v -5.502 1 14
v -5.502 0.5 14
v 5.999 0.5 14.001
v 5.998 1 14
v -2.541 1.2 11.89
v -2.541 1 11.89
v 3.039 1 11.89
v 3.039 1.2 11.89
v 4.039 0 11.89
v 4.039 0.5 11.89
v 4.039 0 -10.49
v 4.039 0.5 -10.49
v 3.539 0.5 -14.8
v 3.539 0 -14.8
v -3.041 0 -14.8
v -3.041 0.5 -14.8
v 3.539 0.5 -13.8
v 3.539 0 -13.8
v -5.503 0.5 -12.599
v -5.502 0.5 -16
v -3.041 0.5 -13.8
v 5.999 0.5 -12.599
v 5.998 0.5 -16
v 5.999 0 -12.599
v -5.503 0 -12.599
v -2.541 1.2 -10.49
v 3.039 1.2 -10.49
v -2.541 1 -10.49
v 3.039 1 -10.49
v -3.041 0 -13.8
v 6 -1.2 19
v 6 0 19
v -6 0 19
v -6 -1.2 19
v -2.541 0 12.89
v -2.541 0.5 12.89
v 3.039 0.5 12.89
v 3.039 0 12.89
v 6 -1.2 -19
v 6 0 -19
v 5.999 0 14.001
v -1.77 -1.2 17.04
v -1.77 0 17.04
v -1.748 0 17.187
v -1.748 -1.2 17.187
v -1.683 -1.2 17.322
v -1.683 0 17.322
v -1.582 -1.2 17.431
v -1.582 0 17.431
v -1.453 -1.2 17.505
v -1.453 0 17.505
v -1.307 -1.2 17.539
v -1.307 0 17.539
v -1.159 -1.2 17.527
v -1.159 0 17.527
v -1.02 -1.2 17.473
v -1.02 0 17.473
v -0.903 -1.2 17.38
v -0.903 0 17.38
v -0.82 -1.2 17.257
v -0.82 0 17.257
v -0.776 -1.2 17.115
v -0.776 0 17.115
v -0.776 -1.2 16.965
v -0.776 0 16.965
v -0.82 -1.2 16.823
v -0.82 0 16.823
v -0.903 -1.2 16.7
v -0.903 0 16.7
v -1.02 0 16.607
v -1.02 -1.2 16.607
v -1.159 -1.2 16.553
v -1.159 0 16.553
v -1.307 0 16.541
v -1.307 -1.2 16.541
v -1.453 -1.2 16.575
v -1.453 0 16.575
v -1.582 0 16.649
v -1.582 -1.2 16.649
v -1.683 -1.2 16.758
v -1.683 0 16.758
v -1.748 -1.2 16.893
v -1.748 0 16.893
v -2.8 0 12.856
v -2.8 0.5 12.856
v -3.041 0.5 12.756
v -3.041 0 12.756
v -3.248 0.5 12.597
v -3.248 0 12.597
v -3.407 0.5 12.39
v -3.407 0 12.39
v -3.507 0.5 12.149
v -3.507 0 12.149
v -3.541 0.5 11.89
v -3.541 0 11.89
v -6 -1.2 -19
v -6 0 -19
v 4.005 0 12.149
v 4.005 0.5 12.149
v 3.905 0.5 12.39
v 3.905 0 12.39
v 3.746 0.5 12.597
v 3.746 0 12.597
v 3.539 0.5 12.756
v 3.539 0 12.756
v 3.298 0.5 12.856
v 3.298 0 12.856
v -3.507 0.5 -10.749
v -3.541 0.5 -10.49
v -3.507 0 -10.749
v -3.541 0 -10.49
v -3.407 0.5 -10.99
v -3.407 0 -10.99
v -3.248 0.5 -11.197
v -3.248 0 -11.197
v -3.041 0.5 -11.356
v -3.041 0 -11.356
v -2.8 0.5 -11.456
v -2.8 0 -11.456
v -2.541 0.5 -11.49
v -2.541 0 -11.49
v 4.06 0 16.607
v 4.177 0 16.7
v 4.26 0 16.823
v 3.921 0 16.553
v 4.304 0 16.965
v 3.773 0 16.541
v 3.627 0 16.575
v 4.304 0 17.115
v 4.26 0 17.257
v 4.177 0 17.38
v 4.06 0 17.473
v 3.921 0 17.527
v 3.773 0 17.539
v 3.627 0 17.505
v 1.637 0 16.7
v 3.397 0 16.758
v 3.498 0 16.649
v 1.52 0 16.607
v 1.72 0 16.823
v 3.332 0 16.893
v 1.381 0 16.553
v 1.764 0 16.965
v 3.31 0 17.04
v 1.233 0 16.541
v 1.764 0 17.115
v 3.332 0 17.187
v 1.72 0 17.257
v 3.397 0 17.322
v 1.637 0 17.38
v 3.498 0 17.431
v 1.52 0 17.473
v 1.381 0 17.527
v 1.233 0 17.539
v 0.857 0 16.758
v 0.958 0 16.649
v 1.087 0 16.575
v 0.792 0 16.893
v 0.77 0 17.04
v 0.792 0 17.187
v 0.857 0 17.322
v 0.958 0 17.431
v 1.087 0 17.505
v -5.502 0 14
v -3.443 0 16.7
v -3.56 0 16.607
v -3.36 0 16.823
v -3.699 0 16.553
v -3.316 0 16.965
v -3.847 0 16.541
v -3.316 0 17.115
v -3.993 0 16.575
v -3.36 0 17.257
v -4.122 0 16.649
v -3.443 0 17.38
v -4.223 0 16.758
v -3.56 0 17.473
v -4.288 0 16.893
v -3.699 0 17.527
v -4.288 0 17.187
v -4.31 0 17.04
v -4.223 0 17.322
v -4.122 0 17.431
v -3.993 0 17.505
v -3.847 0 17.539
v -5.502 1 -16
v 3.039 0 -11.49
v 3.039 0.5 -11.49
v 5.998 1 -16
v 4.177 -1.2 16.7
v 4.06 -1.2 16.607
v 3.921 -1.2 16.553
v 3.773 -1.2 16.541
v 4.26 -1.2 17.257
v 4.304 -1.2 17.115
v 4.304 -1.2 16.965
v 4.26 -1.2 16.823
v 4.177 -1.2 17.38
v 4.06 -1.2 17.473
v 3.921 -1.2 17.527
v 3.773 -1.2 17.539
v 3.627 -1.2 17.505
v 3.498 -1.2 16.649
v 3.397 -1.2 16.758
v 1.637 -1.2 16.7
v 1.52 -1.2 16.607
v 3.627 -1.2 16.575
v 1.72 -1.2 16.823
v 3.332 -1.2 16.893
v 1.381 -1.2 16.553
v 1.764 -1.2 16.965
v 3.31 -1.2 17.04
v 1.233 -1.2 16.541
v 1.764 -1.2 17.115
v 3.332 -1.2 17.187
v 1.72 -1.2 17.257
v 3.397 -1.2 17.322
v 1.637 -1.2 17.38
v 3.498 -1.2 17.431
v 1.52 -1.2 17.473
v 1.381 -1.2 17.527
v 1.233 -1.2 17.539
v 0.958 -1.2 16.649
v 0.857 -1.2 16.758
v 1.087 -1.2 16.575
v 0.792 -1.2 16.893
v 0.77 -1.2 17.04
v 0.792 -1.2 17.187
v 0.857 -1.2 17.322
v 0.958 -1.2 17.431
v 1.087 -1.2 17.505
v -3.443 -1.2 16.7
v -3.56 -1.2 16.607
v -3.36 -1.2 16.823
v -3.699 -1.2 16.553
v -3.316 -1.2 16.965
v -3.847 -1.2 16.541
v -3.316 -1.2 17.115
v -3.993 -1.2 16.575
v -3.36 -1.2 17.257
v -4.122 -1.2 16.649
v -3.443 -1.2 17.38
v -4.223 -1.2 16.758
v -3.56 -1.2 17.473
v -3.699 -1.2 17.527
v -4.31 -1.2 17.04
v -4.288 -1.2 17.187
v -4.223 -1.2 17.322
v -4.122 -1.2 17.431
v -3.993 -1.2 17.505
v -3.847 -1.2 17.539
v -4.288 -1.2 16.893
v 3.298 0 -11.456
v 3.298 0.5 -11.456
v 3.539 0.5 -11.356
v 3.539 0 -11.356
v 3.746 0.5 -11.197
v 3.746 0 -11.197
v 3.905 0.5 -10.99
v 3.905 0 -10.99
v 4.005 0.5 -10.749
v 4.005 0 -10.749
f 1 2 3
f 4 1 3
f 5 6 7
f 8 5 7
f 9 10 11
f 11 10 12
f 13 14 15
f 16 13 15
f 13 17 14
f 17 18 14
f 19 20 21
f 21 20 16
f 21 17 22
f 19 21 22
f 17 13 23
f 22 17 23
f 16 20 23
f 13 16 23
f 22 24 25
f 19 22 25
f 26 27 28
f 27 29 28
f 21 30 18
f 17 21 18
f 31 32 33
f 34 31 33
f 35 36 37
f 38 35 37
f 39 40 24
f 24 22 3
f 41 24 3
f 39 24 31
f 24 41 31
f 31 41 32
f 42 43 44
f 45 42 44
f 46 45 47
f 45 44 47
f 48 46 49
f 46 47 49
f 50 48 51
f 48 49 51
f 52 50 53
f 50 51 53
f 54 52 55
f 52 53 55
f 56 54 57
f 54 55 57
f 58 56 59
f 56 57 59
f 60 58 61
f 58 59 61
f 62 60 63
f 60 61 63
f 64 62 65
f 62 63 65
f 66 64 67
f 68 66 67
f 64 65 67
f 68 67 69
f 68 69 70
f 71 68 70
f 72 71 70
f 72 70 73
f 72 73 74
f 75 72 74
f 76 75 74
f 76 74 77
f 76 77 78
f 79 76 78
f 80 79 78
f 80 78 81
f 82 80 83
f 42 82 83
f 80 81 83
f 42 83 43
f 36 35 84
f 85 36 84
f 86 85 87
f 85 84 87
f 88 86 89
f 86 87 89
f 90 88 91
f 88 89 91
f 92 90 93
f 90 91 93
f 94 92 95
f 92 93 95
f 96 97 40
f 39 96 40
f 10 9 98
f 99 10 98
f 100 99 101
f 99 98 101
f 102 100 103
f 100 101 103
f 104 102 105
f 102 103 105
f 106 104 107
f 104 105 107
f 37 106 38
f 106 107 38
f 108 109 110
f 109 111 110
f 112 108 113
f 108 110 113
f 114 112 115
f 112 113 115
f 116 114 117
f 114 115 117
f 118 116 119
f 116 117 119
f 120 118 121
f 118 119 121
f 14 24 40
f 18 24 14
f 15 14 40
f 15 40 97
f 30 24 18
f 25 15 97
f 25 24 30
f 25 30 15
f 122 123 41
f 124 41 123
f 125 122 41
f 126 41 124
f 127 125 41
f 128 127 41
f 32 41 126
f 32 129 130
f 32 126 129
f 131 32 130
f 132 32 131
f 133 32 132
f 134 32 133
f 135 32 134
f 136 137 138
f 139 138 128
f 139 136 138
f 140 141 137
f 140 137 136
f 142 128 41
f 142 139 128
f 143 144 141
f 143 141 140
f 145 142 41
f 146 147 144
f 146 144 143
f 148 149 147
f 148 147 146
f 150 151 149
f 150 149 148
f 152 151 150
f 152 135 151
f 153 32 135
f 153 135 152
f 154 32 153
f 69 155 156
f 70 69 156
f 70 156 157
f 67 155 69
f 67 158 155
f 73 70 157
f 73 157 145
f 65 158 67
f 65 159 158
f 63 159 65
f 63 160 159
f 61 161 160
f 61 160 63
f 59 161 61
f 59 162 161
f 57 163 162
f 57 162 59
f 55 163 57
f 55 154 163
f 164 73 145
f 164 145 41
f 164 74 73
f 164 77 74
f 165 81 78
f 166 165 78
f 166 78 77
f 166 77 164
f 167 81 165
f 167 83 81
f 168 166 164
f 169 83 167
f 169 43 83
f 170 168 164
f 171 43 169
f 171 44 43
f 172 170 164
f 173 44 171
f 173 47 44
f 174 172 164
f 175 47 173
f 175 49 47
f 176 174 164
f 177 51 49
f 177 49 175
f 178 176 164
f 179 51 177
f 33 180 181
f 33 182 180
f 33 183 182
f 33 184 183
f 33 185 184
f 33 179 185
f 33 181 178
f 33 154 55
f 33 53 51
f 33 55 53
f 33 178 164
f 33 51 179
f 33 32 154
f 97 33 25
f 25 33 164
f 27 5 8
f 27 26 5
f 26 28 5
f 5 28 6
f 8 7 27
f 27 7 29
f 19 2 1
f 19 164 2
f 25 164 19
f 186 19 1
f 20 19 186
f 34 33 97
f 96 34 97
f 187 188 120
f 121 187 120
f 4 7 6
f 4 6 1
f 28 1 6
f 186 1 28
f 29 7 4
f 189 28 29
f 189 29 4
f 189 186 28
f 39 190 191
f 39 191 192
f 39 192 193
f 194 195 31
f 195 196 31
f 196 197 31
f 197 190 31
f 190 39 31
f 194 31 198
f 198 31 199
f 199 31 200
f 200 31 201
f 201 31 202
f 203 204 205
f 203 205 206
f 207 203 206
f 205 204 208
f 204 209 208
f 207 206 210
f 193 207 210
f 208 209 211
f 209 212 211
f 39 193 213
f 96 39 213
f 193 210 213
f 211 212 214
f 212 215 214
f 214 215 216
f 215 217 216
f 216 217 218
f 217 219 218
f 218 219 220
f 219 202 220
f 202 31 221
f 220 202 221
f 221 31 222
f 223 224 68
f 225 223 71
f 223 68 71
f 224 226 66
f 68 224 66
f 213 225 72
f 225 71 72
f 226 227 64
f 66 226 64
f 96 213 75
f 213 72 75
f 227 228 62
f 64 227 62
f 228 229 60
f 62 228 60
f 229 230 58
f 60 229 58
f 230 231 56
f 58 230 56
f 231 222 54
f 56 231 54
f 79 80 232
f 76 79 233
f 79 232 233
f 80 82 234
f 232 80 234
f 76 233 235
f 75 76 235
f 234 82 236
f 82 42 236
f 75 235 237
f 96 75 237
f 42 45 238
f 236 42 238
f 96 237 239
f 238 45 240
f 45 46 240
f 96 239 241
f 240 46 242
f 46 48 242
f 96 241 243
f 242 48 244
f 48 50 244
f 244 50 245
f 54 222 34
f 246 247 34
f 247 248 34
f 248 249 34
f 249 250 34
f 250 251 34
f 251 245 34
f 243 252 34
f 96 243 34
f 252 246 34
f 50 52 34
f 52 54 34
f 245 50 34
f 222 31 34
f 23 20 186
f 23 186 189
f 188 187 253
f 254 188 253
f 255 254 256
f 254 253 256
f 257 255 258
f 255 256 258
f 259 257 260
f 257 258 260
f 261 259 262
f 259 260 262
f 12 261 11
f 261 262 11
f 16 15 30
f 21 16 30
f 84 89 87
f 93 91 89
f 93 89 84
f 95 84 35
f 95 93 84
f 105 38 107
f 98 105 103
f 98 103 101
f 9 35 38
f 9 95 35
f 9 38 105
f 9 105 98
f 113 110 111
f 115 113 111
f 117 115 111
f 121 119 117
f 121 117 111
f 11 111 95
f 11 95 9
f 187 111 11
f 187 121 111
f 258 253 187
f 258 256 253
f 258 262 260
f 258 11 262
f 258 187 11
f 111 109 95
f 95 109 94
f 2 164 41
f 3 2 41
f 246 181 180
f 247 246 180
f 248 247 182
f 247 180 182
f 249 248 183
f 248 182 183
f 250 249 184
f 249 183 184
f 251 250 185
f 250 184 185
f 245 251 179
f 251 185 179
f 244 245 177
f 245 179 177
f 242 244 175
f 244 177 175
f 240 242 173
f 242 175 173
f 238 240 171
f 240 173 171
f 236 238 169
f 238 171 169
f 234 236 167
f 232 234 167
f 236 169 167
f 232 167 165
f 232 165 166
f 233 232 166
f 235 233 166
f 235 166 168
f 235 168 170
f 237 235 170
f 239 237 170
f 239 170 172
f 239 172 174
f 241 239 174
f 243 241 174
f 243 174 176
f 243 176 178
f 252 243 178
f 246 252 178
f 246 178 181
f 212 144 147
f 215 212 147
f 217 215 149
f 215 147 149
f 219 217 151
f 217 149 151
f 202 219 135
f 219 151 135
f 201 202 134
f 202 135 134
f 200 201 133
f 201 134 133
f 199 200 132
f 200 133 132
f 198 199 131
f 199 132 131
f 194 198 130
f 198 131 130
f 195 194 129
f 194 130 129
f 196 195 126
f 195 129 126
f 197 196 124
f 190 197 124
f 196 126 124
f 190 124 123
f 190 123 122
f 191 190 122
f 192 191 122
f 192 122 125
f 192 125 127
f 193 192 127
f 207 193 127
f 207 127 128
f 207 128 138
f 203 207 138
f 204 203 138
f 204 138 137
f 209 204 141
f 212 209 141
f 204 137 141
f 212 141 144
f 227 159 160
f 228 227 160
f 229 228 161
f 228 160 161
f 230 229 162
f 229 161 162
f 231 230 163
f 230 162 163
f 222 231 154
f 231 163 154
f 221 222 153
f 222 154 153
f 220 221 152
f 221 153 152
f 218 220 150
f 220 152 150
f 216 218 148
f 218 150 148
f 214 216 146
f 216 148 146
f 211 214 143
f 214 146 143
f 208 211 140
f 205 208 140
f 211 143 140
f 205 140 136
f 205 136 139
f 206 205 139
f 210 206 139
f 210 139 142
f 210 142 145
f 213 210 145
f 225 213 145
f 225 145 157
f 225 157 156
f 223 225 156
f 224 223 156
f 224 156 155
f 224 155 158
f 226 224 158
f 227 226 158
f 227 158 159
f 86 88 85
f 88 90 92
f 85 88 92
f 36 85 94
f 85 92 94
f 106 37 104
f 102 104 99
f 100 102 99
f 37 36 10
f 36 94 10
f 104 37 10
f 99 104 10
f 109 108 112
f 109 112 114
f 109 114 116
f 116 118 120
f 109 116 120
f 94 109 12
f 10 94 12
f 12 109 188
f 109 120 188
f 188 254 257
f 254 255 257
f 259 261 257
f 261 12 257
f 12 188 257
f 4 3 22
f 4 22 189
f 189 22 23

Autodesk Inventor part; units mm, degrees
ref_plane "YZ Plane" through (0, 0, 0) normal (1, 0, 0) x (0, 1, 0)
ref_plane "XZ Plane" through (0, 0, 0) normal (0, 1, 0) x (-1, 0, 0)
sketch "Sketch1" plane through (0, 0, 0) normal (0, 1, 0) x (-1, 0, 0)
  line L0 (-6, 19) -> (6, 19)
  line L1 (6, 19) -> (6, -19)
  line L2 (6, -19) -> (-6, -19)
  line L3 (-6, -19) -> (-6, 19)
  line L4 (-6, 19) -> (6, -19) construction
  line L5 (6, 19) -> (-6, -19) construction
  line L6 (5.502, -16) -> (-5.998, -16)
  line L7 (5.502, 14) -> (5.502, -16)
  line L8 (0, 19) -> (0, -19) construction
  line L9 (5.503, 14.001) -> (-5.999, 14.001)
  line L10 (-5.999, 14.001) -> (-5.999, -12.599)
  line L11 (-5.999, -12.599) -> (5.503, -12.599)
  line L12 (3.541, 12.89) -> (-4.039, 12.89)
  line L13 (-4.039, 12.89) -> (-4.039, -11.49)
  line L14 (-4.039, -11.49) -> (3.541, -11.49)
  line L15 (3.541, -11.49) -> (3.541, 12.89)
  line L16 (2.541, 11.89) -> (-3.039, 11.89)
  line L17 (-3.039, 11.89) -> (-3.039, -10.49)
  line L18 (-3.039, -10.49) -> (2.541, -10.49)
  line L19 (2.541, -10.49) -> (2.541, 11.89)
  line L20 (-0.249, 12.89) -> (-0.249, -11.49) construction
  line L21 (3.541, 0.7) -> (-4.039, 0.7) construction
  circle A0 centre (-3.81, 17.04) radius 0.5
  circle A1 centre (-1.27, 17.04) radius 0.5
  circle A2 centre (1.27, 17.04) radius 0.5
  circle A3 centre (3.81, 17.04) radius 0.5
  line L22 (3.041, -13.8) -> (-3.539, -13.8)
  line L23 (-3.539, -13.8) -> (-3.539, -14.8)
  line L24 (-3.539, -14.8) -> (3.041, -14.8)
  line L25 (3.041, -14.8) -> (3.041, -13.8)
  line L26 (5.502, 14) -> (-5.998, 14)
  line L27 (5.503, -12.599) -> (5.503, 14.001)
  line L28 (-5.998, 14) -> (-5.998, -16)
  point P0 (0, 0)
  dimension "d0" = 12
  dimension "d1" = 38
  dimension "d2" = 3
  dimension "d3" = 30
  dimension "d5" = 26.6
  dimension "d6" = 7.58
  dimension "d7" = 24.38
  dimension "d8" = 5.58
  dimension "d9" = 22.38
  dimension "d10" = 1.96
  dimension "d11" = 7.51
  dimension "d13" = 2.19
  dimension "d14" = 1.96
  dimension "d15" = 1
  dimension "d18" = 2.54
  dimension "d27" = 1
  dimension "d28" = 1.2
  dimension "d32" = 0.001
  dimension "d33" = 0.001
  dimension "d34" = 0.001
  dimension "d35" = 11.5
  dimension "d36" = 0.001
extrude "Extrusion1" add sketch "Sketch1" against normal blind 1.2 contours L0 L1 L2 L3 L6 L7 L9 | L9 L7 L11 L3 | L11 L7 L6 L3 | L15 L14 L13 L12 | L19 L18 L17 L16 | L25 L24 L23 L22
extrude "Extrusion2" add sketch "Sketch1" along normal blind 0.5 contours L9 L7 L11 L3 | L15 L14 L13 L12 | L19 L18 L17 L16 | L25 L24 L23 L22
sketch "Sketch2" plane through (0, 0.5, 0) normal (0, 1, 0) x (1, 0, 0)
  line L0 (-5.502, -14) -> (-5.502, 16) projected
  line L1 (-5.502, 16) -> (5.998, 16) projected
  line L2 (-5.502, -14) -> (5.998, -14) projected
  line L3 (5.998, -14) -> (5.998, 16) projected
  line L4 (-3.541, -12.89) -> (4.039, -12.89) projected
  line L5 (-3.541, 11.49) -> (-3.541, -12.89) projected
  line L6 (4.039, -12.89) -> (4.039, 11.49) projected
  line L7 (4.039, 11.49) -> (-3.541, 11.49) projected
  point P0 (0, 0)
extrude "Extrusion3" add sketch "Sketch2" along normal blind 0.5 contours L0 L1 L3 L2 | L5 L7 L6 L4
sketch "Sketch3" plane through (0, 1, 0) normal (0, 1, 0) x (1, 0, 0)
  line L0 (-2.541, -11.89) -> (3.039, -11.89) projected
  line L1 (-2.541, 10.49) -> (-2.541, -11.89) projected
  line L2 (3.039, -11.89) -> (3.039, 10.49) projected
  line L3 (3.039, 10.49) -> (-2.541, 10.49) projected
  point P0 (0, 0)
extrude "Extrusion4" add sketch "Sketch3" along normal blind 0.2
extrude "Extrusion5" cut sketch "Sketch2" against normal blind 0.5 contours L5 L7 L6 L4
fillet "Fillet1" radius 1 4 edges at (-3.541, 0.25, 12.89) (4.039, 0.25, -11.49) (-3.541, 0.25, -11.49) (4.039, 0.25, 12.89)
sketch "Sketch4" plane through (0, -1.2, 0) normal (0, 1, 0) x (1, 0, 0)
  line L0 (2.785, -15.895) -> (2.585, -16.095)
  line L1 (2.585, -16.095) -> (2.585, -17.985)
  line L2 (2.585, -17.985) -> (2.785, -18.185)
  line L3 (2.785, -18.185) -> (4.835, -18.185)
  line L4 (4.835, -18.185) -> (5.035, -17.985)
  line L5 (5.035, -17.985) -> (5.035, -16.095)
  line L6 (5.035, -16.095) -> (4.835, -15.895)
  line L7 (4.835, -15.895) -> (2.785, -15.895)
  line L8 (3.81, -18.185) -> (3.81, -15.895) construction
  line L9 (2.585, -17.04) -> (5.035, -17.04) construction
  circle A0 centre (3.81, -17.04) radius 0.5 construction
  line L10 (3.51, -17.34) -> (4.11, -17.34)
  line L11 (4.11, -17.34) -> (4.11, -16.74)
  line L12 (4.11, -16.74) -> (3.51, -16.74)
  line L13 (3.51, -16.74) -> (3.51, -17.34)
  line L14 (3.51, -17.34) -> (4.11, -16.74) construction
  line L15 (4.11, -17.34) -> (3.51, -16.74) construction
  line L16 (6, -19) -> (-6, -19) construction
  line L17 (0.245, -15.895) -> (0.045, -16.095)
  line L18 (0.045, -16.095) -> (0.045, -17.985)
  line L19 (0.045, -17.985) -> (0.245, -18.185)
  line L20 (0.245, -18.185) -> (2.295, -18.185)
  line L21 (2.295, -18.185) -> (2.495, -17.985)
  line L22 (2.495, -17.985) -> (2.495, -16.095)
  line L23 (2.495, -16.095) -> (2.295, -15.895)
  line L24 (2.295, -15.895) -> (0.245, -15.895)
  line L25 (1.27, -18.185) -> (1.27, -15.895) construction
  line L26 (0.045, -17.04) -> (2.495, -17.04) construction
  circle A1 centre (1.27, -17.04) radius 0.5 construction
  line L27 (0.97, -17.34) -> (1.57, -17.34)
  line L28 (1.57, -17.34) -> (1.57, -16.74)
  line L29 (1.57, -16.74) -> (0.97, -16.74)
  line L30 (0.97, -16.74) -> (0.97, -17.34)
  line L31 (0.97, -17.34) -> (1.57, -16.74) construction
  line L32 (1.57, -17.34) -> (0.97, -16.74) construction
  line L33 (-2.295, -15.895) -> (-2.495, -16.095)
  line L34 (-2.495, -16.095) -> (-2.495, -17.985)
  line L35 (-2.495, -17.985) -> (-2.295, -18.185)
  line L36 (-2.295, -18.185) -> (-0.245, -18.185)
  line L37 (-0.245, -18.185) -> (-0.045, -17.985)
  line L38 (-0.045, -17.985) -> (-0.045, -16.095)
  line L39 (-0.045, -16.095) -> (-0.245, -15.895)
  line L40 (-0.245, -15.895) -> (-2.295, -15.895)
  line L41 (-1.27, -18.185) -> (-1.27, -15.895) construction
  line L42 (-2.495, -17.04) -> (-0.045, -17.04) construction
  circle A2 centre (-1.27, -17.04) radius 0.5 construction
  line L43 (-1.57, -17.34) -> (-0.97, -17.34)
  line L44 (-0.97, -17.34) -> (-0.97, -16.74)
  line L45 (-0.97, -16.74) -> (-1.57, -16.74)
  line L46 (-1.57, -16.74) -> (-1.57, -17.34)
  line L47 (-1.57, -17.34) -> (-0.97, -16.74) construction
  line L48 (-0.97, -17.34) -> (-1.57, -16.74) construction
  line L49 (-4.835, -15.895) -> (-5.035, -16.095)
  line L50 (-5.035, -16.095) -> (-5.035, -17.985)
  line L51 (-5.035, -17.985) -> (-4.835, -18.185)
  line L52 (-4.835, -18.185) -> (-2.785, -18.185)
  line L53 (-2.785, -18.185) -> (-2.585, -17.985)
  line L54 (-2.585, -17.985) -> (-2.585, -16.095)
  line L55 (-2.585, -16.095) -> (-2.785, -15.895)
  line L56 (-2.785, -15.895) -> (-4.835, -15.895)
  line L57 (-3.81, -18.185) -> (-3.81, -15.895) construction
  line L58 (-5.035, -17.04) -> (-2.585, -17.04) construction
  circle A3 centre (-3.81, -17.04) radius 0.5 construction
  line L59 (-4.11, -17.34) -> (-3.51, -17.34)
  line L60 (-3.51, -17.34) -> (-3.51, -16.74)
  line L61 (-3.51, -16.74) -> (-4.11, -16.74)
  line L62 (-4.11, -16.74) -> (-4.11, -17.34)
  line L63 (-4.11, -17.34) -> (-3.51, -16.74) construction
  line L64 (-3.51, -17.34) -> (-4.11, -16.74) construction
  circle A4 centre (-3.81, -17.04) radius 0.5 construction
  circle A5 centre (-1.27, -17.04) radius 0.5 construction
  circle A6 centre (1.27, -17.04) radius 0.5 construction
  point P0 (0, 0)
  point P1 (-1.27, -17.04)
  dimension "d43" = 2.05
  dimension "d46" = 1.89
  dimension "d47" = 0.2828
  dimension "d48" = 45
  dimension "d49" = 0.6
  dimension "d50" = 0.6
  dimension "d53" = 135
  dimension "d54" = 135
  dimension "d55" = 135
  dimension "d56" = 2.05
  dimension "d57" = 1.89
  dimension "d58" = 0.2828
  dimension "d59" = 45
  dimension "d60" = 0.6
  dimension "d61" = 0.6
  dimension "d62" = 135
  dimension "d63" = 135
  dimension "d64" = 135
  dimension "d65" = 2.05
  dimension "d66" = 1.89
  dimension "d67" = 0.2828
  dimension "d68" = 45
  dimension "d69" = 0.6
  dimension "d70" = 0.6
  dimension "d71" = 135
  dimension "d72" = 135
  dimension "d73" = 135
  dimension "d74" = 2.05
  dimension "d75" = 1.89
  dimension "d76" = 0.2828
  dimension "d77" = 45
  dimension "d78" = 0.6
  dimension "d79" = 0.6
  dimension "d80" = 135
  dimension "d81" = 135
  dimension "d82" = 135
extrude "Extrusion6" [suppressed]
ref_plane "Work Plane2" through (0, 1.4, 0) normal (0, 1, 0) x (1, 0, 0)
sketch "Sketch5" plane through (0, 1.4, 0) normal (0, 1, 0) x (1, 0, 0)
  line L0 (4.11, -16.74) -> (4.11, -17.34) projected
  line L1 (4.11, -17.34) -> (3.51, -17.34) projected
  line L2 (3.51, -17.34) -> (3.51, -16.74) projected
  line L3 (3.51, -16.74) -> (4.11, -16.74) projected
  line L4 (1.57, -16.74) -> (1.57, -17.34) projected
  line L5 (0.97, -16.74) -> (1.57, -16.74) projected
  line L6 (1.57, -17.34) -> (0.97, -17.34) projected
  line L7 (0.97, -17.34) -> (0.97, -16.74) projected
  line L8 (-3.51, -16.74) -> (-3.51, -17.34) projected
  line L9 (-3.51, -17.34) -> (-4.11, -17.34) projected
  line L10 (-4.11, -17.34) -> (-4.11, -16.74) projected
  line L11 (-4.11, -16.74) -> (-3.51, -16.74) projected
  line L12 (-0.97, -16.74) -> (-0.97, -17.34) projected
  line L13 (-0.97, -17.34) -> (-1.57, -17.34) projected
  line L14 (-1.57, -17.34) -> (-1.57, -16.74) projected
  line L15 (-1.57, -16.74) -> (-0.97, -16.74) projected
  point P0 (0, 0)
  point P1 (4.11, 17.34)
  point P2 (4.11, 16.74)
  point P3 (3.51, 17.34)
  point P4 (3.51, 16.74)
  point P5 (1.57, 17.34)
  point P6 (1.57, 16.74)
  point P7 (0.97, 16.74)
  point P8 (0.97, 17.34)
  point P9 (-3.51, 17.34)
  point P10 (-3.51, 16.74)
  point P11 (-4.11, 17.34)
  point P12 (-4.11, 16.74)
  point P13 (-0.97, 17.34)
  point P14 (-0.97, 16.74)
  point P15 (-1.57, 17.34)
  point P16 (-1.57, 16.74)
extrude "Extrusion7" [suppressed]
properties part number "LED Screen 0.91 inch"
